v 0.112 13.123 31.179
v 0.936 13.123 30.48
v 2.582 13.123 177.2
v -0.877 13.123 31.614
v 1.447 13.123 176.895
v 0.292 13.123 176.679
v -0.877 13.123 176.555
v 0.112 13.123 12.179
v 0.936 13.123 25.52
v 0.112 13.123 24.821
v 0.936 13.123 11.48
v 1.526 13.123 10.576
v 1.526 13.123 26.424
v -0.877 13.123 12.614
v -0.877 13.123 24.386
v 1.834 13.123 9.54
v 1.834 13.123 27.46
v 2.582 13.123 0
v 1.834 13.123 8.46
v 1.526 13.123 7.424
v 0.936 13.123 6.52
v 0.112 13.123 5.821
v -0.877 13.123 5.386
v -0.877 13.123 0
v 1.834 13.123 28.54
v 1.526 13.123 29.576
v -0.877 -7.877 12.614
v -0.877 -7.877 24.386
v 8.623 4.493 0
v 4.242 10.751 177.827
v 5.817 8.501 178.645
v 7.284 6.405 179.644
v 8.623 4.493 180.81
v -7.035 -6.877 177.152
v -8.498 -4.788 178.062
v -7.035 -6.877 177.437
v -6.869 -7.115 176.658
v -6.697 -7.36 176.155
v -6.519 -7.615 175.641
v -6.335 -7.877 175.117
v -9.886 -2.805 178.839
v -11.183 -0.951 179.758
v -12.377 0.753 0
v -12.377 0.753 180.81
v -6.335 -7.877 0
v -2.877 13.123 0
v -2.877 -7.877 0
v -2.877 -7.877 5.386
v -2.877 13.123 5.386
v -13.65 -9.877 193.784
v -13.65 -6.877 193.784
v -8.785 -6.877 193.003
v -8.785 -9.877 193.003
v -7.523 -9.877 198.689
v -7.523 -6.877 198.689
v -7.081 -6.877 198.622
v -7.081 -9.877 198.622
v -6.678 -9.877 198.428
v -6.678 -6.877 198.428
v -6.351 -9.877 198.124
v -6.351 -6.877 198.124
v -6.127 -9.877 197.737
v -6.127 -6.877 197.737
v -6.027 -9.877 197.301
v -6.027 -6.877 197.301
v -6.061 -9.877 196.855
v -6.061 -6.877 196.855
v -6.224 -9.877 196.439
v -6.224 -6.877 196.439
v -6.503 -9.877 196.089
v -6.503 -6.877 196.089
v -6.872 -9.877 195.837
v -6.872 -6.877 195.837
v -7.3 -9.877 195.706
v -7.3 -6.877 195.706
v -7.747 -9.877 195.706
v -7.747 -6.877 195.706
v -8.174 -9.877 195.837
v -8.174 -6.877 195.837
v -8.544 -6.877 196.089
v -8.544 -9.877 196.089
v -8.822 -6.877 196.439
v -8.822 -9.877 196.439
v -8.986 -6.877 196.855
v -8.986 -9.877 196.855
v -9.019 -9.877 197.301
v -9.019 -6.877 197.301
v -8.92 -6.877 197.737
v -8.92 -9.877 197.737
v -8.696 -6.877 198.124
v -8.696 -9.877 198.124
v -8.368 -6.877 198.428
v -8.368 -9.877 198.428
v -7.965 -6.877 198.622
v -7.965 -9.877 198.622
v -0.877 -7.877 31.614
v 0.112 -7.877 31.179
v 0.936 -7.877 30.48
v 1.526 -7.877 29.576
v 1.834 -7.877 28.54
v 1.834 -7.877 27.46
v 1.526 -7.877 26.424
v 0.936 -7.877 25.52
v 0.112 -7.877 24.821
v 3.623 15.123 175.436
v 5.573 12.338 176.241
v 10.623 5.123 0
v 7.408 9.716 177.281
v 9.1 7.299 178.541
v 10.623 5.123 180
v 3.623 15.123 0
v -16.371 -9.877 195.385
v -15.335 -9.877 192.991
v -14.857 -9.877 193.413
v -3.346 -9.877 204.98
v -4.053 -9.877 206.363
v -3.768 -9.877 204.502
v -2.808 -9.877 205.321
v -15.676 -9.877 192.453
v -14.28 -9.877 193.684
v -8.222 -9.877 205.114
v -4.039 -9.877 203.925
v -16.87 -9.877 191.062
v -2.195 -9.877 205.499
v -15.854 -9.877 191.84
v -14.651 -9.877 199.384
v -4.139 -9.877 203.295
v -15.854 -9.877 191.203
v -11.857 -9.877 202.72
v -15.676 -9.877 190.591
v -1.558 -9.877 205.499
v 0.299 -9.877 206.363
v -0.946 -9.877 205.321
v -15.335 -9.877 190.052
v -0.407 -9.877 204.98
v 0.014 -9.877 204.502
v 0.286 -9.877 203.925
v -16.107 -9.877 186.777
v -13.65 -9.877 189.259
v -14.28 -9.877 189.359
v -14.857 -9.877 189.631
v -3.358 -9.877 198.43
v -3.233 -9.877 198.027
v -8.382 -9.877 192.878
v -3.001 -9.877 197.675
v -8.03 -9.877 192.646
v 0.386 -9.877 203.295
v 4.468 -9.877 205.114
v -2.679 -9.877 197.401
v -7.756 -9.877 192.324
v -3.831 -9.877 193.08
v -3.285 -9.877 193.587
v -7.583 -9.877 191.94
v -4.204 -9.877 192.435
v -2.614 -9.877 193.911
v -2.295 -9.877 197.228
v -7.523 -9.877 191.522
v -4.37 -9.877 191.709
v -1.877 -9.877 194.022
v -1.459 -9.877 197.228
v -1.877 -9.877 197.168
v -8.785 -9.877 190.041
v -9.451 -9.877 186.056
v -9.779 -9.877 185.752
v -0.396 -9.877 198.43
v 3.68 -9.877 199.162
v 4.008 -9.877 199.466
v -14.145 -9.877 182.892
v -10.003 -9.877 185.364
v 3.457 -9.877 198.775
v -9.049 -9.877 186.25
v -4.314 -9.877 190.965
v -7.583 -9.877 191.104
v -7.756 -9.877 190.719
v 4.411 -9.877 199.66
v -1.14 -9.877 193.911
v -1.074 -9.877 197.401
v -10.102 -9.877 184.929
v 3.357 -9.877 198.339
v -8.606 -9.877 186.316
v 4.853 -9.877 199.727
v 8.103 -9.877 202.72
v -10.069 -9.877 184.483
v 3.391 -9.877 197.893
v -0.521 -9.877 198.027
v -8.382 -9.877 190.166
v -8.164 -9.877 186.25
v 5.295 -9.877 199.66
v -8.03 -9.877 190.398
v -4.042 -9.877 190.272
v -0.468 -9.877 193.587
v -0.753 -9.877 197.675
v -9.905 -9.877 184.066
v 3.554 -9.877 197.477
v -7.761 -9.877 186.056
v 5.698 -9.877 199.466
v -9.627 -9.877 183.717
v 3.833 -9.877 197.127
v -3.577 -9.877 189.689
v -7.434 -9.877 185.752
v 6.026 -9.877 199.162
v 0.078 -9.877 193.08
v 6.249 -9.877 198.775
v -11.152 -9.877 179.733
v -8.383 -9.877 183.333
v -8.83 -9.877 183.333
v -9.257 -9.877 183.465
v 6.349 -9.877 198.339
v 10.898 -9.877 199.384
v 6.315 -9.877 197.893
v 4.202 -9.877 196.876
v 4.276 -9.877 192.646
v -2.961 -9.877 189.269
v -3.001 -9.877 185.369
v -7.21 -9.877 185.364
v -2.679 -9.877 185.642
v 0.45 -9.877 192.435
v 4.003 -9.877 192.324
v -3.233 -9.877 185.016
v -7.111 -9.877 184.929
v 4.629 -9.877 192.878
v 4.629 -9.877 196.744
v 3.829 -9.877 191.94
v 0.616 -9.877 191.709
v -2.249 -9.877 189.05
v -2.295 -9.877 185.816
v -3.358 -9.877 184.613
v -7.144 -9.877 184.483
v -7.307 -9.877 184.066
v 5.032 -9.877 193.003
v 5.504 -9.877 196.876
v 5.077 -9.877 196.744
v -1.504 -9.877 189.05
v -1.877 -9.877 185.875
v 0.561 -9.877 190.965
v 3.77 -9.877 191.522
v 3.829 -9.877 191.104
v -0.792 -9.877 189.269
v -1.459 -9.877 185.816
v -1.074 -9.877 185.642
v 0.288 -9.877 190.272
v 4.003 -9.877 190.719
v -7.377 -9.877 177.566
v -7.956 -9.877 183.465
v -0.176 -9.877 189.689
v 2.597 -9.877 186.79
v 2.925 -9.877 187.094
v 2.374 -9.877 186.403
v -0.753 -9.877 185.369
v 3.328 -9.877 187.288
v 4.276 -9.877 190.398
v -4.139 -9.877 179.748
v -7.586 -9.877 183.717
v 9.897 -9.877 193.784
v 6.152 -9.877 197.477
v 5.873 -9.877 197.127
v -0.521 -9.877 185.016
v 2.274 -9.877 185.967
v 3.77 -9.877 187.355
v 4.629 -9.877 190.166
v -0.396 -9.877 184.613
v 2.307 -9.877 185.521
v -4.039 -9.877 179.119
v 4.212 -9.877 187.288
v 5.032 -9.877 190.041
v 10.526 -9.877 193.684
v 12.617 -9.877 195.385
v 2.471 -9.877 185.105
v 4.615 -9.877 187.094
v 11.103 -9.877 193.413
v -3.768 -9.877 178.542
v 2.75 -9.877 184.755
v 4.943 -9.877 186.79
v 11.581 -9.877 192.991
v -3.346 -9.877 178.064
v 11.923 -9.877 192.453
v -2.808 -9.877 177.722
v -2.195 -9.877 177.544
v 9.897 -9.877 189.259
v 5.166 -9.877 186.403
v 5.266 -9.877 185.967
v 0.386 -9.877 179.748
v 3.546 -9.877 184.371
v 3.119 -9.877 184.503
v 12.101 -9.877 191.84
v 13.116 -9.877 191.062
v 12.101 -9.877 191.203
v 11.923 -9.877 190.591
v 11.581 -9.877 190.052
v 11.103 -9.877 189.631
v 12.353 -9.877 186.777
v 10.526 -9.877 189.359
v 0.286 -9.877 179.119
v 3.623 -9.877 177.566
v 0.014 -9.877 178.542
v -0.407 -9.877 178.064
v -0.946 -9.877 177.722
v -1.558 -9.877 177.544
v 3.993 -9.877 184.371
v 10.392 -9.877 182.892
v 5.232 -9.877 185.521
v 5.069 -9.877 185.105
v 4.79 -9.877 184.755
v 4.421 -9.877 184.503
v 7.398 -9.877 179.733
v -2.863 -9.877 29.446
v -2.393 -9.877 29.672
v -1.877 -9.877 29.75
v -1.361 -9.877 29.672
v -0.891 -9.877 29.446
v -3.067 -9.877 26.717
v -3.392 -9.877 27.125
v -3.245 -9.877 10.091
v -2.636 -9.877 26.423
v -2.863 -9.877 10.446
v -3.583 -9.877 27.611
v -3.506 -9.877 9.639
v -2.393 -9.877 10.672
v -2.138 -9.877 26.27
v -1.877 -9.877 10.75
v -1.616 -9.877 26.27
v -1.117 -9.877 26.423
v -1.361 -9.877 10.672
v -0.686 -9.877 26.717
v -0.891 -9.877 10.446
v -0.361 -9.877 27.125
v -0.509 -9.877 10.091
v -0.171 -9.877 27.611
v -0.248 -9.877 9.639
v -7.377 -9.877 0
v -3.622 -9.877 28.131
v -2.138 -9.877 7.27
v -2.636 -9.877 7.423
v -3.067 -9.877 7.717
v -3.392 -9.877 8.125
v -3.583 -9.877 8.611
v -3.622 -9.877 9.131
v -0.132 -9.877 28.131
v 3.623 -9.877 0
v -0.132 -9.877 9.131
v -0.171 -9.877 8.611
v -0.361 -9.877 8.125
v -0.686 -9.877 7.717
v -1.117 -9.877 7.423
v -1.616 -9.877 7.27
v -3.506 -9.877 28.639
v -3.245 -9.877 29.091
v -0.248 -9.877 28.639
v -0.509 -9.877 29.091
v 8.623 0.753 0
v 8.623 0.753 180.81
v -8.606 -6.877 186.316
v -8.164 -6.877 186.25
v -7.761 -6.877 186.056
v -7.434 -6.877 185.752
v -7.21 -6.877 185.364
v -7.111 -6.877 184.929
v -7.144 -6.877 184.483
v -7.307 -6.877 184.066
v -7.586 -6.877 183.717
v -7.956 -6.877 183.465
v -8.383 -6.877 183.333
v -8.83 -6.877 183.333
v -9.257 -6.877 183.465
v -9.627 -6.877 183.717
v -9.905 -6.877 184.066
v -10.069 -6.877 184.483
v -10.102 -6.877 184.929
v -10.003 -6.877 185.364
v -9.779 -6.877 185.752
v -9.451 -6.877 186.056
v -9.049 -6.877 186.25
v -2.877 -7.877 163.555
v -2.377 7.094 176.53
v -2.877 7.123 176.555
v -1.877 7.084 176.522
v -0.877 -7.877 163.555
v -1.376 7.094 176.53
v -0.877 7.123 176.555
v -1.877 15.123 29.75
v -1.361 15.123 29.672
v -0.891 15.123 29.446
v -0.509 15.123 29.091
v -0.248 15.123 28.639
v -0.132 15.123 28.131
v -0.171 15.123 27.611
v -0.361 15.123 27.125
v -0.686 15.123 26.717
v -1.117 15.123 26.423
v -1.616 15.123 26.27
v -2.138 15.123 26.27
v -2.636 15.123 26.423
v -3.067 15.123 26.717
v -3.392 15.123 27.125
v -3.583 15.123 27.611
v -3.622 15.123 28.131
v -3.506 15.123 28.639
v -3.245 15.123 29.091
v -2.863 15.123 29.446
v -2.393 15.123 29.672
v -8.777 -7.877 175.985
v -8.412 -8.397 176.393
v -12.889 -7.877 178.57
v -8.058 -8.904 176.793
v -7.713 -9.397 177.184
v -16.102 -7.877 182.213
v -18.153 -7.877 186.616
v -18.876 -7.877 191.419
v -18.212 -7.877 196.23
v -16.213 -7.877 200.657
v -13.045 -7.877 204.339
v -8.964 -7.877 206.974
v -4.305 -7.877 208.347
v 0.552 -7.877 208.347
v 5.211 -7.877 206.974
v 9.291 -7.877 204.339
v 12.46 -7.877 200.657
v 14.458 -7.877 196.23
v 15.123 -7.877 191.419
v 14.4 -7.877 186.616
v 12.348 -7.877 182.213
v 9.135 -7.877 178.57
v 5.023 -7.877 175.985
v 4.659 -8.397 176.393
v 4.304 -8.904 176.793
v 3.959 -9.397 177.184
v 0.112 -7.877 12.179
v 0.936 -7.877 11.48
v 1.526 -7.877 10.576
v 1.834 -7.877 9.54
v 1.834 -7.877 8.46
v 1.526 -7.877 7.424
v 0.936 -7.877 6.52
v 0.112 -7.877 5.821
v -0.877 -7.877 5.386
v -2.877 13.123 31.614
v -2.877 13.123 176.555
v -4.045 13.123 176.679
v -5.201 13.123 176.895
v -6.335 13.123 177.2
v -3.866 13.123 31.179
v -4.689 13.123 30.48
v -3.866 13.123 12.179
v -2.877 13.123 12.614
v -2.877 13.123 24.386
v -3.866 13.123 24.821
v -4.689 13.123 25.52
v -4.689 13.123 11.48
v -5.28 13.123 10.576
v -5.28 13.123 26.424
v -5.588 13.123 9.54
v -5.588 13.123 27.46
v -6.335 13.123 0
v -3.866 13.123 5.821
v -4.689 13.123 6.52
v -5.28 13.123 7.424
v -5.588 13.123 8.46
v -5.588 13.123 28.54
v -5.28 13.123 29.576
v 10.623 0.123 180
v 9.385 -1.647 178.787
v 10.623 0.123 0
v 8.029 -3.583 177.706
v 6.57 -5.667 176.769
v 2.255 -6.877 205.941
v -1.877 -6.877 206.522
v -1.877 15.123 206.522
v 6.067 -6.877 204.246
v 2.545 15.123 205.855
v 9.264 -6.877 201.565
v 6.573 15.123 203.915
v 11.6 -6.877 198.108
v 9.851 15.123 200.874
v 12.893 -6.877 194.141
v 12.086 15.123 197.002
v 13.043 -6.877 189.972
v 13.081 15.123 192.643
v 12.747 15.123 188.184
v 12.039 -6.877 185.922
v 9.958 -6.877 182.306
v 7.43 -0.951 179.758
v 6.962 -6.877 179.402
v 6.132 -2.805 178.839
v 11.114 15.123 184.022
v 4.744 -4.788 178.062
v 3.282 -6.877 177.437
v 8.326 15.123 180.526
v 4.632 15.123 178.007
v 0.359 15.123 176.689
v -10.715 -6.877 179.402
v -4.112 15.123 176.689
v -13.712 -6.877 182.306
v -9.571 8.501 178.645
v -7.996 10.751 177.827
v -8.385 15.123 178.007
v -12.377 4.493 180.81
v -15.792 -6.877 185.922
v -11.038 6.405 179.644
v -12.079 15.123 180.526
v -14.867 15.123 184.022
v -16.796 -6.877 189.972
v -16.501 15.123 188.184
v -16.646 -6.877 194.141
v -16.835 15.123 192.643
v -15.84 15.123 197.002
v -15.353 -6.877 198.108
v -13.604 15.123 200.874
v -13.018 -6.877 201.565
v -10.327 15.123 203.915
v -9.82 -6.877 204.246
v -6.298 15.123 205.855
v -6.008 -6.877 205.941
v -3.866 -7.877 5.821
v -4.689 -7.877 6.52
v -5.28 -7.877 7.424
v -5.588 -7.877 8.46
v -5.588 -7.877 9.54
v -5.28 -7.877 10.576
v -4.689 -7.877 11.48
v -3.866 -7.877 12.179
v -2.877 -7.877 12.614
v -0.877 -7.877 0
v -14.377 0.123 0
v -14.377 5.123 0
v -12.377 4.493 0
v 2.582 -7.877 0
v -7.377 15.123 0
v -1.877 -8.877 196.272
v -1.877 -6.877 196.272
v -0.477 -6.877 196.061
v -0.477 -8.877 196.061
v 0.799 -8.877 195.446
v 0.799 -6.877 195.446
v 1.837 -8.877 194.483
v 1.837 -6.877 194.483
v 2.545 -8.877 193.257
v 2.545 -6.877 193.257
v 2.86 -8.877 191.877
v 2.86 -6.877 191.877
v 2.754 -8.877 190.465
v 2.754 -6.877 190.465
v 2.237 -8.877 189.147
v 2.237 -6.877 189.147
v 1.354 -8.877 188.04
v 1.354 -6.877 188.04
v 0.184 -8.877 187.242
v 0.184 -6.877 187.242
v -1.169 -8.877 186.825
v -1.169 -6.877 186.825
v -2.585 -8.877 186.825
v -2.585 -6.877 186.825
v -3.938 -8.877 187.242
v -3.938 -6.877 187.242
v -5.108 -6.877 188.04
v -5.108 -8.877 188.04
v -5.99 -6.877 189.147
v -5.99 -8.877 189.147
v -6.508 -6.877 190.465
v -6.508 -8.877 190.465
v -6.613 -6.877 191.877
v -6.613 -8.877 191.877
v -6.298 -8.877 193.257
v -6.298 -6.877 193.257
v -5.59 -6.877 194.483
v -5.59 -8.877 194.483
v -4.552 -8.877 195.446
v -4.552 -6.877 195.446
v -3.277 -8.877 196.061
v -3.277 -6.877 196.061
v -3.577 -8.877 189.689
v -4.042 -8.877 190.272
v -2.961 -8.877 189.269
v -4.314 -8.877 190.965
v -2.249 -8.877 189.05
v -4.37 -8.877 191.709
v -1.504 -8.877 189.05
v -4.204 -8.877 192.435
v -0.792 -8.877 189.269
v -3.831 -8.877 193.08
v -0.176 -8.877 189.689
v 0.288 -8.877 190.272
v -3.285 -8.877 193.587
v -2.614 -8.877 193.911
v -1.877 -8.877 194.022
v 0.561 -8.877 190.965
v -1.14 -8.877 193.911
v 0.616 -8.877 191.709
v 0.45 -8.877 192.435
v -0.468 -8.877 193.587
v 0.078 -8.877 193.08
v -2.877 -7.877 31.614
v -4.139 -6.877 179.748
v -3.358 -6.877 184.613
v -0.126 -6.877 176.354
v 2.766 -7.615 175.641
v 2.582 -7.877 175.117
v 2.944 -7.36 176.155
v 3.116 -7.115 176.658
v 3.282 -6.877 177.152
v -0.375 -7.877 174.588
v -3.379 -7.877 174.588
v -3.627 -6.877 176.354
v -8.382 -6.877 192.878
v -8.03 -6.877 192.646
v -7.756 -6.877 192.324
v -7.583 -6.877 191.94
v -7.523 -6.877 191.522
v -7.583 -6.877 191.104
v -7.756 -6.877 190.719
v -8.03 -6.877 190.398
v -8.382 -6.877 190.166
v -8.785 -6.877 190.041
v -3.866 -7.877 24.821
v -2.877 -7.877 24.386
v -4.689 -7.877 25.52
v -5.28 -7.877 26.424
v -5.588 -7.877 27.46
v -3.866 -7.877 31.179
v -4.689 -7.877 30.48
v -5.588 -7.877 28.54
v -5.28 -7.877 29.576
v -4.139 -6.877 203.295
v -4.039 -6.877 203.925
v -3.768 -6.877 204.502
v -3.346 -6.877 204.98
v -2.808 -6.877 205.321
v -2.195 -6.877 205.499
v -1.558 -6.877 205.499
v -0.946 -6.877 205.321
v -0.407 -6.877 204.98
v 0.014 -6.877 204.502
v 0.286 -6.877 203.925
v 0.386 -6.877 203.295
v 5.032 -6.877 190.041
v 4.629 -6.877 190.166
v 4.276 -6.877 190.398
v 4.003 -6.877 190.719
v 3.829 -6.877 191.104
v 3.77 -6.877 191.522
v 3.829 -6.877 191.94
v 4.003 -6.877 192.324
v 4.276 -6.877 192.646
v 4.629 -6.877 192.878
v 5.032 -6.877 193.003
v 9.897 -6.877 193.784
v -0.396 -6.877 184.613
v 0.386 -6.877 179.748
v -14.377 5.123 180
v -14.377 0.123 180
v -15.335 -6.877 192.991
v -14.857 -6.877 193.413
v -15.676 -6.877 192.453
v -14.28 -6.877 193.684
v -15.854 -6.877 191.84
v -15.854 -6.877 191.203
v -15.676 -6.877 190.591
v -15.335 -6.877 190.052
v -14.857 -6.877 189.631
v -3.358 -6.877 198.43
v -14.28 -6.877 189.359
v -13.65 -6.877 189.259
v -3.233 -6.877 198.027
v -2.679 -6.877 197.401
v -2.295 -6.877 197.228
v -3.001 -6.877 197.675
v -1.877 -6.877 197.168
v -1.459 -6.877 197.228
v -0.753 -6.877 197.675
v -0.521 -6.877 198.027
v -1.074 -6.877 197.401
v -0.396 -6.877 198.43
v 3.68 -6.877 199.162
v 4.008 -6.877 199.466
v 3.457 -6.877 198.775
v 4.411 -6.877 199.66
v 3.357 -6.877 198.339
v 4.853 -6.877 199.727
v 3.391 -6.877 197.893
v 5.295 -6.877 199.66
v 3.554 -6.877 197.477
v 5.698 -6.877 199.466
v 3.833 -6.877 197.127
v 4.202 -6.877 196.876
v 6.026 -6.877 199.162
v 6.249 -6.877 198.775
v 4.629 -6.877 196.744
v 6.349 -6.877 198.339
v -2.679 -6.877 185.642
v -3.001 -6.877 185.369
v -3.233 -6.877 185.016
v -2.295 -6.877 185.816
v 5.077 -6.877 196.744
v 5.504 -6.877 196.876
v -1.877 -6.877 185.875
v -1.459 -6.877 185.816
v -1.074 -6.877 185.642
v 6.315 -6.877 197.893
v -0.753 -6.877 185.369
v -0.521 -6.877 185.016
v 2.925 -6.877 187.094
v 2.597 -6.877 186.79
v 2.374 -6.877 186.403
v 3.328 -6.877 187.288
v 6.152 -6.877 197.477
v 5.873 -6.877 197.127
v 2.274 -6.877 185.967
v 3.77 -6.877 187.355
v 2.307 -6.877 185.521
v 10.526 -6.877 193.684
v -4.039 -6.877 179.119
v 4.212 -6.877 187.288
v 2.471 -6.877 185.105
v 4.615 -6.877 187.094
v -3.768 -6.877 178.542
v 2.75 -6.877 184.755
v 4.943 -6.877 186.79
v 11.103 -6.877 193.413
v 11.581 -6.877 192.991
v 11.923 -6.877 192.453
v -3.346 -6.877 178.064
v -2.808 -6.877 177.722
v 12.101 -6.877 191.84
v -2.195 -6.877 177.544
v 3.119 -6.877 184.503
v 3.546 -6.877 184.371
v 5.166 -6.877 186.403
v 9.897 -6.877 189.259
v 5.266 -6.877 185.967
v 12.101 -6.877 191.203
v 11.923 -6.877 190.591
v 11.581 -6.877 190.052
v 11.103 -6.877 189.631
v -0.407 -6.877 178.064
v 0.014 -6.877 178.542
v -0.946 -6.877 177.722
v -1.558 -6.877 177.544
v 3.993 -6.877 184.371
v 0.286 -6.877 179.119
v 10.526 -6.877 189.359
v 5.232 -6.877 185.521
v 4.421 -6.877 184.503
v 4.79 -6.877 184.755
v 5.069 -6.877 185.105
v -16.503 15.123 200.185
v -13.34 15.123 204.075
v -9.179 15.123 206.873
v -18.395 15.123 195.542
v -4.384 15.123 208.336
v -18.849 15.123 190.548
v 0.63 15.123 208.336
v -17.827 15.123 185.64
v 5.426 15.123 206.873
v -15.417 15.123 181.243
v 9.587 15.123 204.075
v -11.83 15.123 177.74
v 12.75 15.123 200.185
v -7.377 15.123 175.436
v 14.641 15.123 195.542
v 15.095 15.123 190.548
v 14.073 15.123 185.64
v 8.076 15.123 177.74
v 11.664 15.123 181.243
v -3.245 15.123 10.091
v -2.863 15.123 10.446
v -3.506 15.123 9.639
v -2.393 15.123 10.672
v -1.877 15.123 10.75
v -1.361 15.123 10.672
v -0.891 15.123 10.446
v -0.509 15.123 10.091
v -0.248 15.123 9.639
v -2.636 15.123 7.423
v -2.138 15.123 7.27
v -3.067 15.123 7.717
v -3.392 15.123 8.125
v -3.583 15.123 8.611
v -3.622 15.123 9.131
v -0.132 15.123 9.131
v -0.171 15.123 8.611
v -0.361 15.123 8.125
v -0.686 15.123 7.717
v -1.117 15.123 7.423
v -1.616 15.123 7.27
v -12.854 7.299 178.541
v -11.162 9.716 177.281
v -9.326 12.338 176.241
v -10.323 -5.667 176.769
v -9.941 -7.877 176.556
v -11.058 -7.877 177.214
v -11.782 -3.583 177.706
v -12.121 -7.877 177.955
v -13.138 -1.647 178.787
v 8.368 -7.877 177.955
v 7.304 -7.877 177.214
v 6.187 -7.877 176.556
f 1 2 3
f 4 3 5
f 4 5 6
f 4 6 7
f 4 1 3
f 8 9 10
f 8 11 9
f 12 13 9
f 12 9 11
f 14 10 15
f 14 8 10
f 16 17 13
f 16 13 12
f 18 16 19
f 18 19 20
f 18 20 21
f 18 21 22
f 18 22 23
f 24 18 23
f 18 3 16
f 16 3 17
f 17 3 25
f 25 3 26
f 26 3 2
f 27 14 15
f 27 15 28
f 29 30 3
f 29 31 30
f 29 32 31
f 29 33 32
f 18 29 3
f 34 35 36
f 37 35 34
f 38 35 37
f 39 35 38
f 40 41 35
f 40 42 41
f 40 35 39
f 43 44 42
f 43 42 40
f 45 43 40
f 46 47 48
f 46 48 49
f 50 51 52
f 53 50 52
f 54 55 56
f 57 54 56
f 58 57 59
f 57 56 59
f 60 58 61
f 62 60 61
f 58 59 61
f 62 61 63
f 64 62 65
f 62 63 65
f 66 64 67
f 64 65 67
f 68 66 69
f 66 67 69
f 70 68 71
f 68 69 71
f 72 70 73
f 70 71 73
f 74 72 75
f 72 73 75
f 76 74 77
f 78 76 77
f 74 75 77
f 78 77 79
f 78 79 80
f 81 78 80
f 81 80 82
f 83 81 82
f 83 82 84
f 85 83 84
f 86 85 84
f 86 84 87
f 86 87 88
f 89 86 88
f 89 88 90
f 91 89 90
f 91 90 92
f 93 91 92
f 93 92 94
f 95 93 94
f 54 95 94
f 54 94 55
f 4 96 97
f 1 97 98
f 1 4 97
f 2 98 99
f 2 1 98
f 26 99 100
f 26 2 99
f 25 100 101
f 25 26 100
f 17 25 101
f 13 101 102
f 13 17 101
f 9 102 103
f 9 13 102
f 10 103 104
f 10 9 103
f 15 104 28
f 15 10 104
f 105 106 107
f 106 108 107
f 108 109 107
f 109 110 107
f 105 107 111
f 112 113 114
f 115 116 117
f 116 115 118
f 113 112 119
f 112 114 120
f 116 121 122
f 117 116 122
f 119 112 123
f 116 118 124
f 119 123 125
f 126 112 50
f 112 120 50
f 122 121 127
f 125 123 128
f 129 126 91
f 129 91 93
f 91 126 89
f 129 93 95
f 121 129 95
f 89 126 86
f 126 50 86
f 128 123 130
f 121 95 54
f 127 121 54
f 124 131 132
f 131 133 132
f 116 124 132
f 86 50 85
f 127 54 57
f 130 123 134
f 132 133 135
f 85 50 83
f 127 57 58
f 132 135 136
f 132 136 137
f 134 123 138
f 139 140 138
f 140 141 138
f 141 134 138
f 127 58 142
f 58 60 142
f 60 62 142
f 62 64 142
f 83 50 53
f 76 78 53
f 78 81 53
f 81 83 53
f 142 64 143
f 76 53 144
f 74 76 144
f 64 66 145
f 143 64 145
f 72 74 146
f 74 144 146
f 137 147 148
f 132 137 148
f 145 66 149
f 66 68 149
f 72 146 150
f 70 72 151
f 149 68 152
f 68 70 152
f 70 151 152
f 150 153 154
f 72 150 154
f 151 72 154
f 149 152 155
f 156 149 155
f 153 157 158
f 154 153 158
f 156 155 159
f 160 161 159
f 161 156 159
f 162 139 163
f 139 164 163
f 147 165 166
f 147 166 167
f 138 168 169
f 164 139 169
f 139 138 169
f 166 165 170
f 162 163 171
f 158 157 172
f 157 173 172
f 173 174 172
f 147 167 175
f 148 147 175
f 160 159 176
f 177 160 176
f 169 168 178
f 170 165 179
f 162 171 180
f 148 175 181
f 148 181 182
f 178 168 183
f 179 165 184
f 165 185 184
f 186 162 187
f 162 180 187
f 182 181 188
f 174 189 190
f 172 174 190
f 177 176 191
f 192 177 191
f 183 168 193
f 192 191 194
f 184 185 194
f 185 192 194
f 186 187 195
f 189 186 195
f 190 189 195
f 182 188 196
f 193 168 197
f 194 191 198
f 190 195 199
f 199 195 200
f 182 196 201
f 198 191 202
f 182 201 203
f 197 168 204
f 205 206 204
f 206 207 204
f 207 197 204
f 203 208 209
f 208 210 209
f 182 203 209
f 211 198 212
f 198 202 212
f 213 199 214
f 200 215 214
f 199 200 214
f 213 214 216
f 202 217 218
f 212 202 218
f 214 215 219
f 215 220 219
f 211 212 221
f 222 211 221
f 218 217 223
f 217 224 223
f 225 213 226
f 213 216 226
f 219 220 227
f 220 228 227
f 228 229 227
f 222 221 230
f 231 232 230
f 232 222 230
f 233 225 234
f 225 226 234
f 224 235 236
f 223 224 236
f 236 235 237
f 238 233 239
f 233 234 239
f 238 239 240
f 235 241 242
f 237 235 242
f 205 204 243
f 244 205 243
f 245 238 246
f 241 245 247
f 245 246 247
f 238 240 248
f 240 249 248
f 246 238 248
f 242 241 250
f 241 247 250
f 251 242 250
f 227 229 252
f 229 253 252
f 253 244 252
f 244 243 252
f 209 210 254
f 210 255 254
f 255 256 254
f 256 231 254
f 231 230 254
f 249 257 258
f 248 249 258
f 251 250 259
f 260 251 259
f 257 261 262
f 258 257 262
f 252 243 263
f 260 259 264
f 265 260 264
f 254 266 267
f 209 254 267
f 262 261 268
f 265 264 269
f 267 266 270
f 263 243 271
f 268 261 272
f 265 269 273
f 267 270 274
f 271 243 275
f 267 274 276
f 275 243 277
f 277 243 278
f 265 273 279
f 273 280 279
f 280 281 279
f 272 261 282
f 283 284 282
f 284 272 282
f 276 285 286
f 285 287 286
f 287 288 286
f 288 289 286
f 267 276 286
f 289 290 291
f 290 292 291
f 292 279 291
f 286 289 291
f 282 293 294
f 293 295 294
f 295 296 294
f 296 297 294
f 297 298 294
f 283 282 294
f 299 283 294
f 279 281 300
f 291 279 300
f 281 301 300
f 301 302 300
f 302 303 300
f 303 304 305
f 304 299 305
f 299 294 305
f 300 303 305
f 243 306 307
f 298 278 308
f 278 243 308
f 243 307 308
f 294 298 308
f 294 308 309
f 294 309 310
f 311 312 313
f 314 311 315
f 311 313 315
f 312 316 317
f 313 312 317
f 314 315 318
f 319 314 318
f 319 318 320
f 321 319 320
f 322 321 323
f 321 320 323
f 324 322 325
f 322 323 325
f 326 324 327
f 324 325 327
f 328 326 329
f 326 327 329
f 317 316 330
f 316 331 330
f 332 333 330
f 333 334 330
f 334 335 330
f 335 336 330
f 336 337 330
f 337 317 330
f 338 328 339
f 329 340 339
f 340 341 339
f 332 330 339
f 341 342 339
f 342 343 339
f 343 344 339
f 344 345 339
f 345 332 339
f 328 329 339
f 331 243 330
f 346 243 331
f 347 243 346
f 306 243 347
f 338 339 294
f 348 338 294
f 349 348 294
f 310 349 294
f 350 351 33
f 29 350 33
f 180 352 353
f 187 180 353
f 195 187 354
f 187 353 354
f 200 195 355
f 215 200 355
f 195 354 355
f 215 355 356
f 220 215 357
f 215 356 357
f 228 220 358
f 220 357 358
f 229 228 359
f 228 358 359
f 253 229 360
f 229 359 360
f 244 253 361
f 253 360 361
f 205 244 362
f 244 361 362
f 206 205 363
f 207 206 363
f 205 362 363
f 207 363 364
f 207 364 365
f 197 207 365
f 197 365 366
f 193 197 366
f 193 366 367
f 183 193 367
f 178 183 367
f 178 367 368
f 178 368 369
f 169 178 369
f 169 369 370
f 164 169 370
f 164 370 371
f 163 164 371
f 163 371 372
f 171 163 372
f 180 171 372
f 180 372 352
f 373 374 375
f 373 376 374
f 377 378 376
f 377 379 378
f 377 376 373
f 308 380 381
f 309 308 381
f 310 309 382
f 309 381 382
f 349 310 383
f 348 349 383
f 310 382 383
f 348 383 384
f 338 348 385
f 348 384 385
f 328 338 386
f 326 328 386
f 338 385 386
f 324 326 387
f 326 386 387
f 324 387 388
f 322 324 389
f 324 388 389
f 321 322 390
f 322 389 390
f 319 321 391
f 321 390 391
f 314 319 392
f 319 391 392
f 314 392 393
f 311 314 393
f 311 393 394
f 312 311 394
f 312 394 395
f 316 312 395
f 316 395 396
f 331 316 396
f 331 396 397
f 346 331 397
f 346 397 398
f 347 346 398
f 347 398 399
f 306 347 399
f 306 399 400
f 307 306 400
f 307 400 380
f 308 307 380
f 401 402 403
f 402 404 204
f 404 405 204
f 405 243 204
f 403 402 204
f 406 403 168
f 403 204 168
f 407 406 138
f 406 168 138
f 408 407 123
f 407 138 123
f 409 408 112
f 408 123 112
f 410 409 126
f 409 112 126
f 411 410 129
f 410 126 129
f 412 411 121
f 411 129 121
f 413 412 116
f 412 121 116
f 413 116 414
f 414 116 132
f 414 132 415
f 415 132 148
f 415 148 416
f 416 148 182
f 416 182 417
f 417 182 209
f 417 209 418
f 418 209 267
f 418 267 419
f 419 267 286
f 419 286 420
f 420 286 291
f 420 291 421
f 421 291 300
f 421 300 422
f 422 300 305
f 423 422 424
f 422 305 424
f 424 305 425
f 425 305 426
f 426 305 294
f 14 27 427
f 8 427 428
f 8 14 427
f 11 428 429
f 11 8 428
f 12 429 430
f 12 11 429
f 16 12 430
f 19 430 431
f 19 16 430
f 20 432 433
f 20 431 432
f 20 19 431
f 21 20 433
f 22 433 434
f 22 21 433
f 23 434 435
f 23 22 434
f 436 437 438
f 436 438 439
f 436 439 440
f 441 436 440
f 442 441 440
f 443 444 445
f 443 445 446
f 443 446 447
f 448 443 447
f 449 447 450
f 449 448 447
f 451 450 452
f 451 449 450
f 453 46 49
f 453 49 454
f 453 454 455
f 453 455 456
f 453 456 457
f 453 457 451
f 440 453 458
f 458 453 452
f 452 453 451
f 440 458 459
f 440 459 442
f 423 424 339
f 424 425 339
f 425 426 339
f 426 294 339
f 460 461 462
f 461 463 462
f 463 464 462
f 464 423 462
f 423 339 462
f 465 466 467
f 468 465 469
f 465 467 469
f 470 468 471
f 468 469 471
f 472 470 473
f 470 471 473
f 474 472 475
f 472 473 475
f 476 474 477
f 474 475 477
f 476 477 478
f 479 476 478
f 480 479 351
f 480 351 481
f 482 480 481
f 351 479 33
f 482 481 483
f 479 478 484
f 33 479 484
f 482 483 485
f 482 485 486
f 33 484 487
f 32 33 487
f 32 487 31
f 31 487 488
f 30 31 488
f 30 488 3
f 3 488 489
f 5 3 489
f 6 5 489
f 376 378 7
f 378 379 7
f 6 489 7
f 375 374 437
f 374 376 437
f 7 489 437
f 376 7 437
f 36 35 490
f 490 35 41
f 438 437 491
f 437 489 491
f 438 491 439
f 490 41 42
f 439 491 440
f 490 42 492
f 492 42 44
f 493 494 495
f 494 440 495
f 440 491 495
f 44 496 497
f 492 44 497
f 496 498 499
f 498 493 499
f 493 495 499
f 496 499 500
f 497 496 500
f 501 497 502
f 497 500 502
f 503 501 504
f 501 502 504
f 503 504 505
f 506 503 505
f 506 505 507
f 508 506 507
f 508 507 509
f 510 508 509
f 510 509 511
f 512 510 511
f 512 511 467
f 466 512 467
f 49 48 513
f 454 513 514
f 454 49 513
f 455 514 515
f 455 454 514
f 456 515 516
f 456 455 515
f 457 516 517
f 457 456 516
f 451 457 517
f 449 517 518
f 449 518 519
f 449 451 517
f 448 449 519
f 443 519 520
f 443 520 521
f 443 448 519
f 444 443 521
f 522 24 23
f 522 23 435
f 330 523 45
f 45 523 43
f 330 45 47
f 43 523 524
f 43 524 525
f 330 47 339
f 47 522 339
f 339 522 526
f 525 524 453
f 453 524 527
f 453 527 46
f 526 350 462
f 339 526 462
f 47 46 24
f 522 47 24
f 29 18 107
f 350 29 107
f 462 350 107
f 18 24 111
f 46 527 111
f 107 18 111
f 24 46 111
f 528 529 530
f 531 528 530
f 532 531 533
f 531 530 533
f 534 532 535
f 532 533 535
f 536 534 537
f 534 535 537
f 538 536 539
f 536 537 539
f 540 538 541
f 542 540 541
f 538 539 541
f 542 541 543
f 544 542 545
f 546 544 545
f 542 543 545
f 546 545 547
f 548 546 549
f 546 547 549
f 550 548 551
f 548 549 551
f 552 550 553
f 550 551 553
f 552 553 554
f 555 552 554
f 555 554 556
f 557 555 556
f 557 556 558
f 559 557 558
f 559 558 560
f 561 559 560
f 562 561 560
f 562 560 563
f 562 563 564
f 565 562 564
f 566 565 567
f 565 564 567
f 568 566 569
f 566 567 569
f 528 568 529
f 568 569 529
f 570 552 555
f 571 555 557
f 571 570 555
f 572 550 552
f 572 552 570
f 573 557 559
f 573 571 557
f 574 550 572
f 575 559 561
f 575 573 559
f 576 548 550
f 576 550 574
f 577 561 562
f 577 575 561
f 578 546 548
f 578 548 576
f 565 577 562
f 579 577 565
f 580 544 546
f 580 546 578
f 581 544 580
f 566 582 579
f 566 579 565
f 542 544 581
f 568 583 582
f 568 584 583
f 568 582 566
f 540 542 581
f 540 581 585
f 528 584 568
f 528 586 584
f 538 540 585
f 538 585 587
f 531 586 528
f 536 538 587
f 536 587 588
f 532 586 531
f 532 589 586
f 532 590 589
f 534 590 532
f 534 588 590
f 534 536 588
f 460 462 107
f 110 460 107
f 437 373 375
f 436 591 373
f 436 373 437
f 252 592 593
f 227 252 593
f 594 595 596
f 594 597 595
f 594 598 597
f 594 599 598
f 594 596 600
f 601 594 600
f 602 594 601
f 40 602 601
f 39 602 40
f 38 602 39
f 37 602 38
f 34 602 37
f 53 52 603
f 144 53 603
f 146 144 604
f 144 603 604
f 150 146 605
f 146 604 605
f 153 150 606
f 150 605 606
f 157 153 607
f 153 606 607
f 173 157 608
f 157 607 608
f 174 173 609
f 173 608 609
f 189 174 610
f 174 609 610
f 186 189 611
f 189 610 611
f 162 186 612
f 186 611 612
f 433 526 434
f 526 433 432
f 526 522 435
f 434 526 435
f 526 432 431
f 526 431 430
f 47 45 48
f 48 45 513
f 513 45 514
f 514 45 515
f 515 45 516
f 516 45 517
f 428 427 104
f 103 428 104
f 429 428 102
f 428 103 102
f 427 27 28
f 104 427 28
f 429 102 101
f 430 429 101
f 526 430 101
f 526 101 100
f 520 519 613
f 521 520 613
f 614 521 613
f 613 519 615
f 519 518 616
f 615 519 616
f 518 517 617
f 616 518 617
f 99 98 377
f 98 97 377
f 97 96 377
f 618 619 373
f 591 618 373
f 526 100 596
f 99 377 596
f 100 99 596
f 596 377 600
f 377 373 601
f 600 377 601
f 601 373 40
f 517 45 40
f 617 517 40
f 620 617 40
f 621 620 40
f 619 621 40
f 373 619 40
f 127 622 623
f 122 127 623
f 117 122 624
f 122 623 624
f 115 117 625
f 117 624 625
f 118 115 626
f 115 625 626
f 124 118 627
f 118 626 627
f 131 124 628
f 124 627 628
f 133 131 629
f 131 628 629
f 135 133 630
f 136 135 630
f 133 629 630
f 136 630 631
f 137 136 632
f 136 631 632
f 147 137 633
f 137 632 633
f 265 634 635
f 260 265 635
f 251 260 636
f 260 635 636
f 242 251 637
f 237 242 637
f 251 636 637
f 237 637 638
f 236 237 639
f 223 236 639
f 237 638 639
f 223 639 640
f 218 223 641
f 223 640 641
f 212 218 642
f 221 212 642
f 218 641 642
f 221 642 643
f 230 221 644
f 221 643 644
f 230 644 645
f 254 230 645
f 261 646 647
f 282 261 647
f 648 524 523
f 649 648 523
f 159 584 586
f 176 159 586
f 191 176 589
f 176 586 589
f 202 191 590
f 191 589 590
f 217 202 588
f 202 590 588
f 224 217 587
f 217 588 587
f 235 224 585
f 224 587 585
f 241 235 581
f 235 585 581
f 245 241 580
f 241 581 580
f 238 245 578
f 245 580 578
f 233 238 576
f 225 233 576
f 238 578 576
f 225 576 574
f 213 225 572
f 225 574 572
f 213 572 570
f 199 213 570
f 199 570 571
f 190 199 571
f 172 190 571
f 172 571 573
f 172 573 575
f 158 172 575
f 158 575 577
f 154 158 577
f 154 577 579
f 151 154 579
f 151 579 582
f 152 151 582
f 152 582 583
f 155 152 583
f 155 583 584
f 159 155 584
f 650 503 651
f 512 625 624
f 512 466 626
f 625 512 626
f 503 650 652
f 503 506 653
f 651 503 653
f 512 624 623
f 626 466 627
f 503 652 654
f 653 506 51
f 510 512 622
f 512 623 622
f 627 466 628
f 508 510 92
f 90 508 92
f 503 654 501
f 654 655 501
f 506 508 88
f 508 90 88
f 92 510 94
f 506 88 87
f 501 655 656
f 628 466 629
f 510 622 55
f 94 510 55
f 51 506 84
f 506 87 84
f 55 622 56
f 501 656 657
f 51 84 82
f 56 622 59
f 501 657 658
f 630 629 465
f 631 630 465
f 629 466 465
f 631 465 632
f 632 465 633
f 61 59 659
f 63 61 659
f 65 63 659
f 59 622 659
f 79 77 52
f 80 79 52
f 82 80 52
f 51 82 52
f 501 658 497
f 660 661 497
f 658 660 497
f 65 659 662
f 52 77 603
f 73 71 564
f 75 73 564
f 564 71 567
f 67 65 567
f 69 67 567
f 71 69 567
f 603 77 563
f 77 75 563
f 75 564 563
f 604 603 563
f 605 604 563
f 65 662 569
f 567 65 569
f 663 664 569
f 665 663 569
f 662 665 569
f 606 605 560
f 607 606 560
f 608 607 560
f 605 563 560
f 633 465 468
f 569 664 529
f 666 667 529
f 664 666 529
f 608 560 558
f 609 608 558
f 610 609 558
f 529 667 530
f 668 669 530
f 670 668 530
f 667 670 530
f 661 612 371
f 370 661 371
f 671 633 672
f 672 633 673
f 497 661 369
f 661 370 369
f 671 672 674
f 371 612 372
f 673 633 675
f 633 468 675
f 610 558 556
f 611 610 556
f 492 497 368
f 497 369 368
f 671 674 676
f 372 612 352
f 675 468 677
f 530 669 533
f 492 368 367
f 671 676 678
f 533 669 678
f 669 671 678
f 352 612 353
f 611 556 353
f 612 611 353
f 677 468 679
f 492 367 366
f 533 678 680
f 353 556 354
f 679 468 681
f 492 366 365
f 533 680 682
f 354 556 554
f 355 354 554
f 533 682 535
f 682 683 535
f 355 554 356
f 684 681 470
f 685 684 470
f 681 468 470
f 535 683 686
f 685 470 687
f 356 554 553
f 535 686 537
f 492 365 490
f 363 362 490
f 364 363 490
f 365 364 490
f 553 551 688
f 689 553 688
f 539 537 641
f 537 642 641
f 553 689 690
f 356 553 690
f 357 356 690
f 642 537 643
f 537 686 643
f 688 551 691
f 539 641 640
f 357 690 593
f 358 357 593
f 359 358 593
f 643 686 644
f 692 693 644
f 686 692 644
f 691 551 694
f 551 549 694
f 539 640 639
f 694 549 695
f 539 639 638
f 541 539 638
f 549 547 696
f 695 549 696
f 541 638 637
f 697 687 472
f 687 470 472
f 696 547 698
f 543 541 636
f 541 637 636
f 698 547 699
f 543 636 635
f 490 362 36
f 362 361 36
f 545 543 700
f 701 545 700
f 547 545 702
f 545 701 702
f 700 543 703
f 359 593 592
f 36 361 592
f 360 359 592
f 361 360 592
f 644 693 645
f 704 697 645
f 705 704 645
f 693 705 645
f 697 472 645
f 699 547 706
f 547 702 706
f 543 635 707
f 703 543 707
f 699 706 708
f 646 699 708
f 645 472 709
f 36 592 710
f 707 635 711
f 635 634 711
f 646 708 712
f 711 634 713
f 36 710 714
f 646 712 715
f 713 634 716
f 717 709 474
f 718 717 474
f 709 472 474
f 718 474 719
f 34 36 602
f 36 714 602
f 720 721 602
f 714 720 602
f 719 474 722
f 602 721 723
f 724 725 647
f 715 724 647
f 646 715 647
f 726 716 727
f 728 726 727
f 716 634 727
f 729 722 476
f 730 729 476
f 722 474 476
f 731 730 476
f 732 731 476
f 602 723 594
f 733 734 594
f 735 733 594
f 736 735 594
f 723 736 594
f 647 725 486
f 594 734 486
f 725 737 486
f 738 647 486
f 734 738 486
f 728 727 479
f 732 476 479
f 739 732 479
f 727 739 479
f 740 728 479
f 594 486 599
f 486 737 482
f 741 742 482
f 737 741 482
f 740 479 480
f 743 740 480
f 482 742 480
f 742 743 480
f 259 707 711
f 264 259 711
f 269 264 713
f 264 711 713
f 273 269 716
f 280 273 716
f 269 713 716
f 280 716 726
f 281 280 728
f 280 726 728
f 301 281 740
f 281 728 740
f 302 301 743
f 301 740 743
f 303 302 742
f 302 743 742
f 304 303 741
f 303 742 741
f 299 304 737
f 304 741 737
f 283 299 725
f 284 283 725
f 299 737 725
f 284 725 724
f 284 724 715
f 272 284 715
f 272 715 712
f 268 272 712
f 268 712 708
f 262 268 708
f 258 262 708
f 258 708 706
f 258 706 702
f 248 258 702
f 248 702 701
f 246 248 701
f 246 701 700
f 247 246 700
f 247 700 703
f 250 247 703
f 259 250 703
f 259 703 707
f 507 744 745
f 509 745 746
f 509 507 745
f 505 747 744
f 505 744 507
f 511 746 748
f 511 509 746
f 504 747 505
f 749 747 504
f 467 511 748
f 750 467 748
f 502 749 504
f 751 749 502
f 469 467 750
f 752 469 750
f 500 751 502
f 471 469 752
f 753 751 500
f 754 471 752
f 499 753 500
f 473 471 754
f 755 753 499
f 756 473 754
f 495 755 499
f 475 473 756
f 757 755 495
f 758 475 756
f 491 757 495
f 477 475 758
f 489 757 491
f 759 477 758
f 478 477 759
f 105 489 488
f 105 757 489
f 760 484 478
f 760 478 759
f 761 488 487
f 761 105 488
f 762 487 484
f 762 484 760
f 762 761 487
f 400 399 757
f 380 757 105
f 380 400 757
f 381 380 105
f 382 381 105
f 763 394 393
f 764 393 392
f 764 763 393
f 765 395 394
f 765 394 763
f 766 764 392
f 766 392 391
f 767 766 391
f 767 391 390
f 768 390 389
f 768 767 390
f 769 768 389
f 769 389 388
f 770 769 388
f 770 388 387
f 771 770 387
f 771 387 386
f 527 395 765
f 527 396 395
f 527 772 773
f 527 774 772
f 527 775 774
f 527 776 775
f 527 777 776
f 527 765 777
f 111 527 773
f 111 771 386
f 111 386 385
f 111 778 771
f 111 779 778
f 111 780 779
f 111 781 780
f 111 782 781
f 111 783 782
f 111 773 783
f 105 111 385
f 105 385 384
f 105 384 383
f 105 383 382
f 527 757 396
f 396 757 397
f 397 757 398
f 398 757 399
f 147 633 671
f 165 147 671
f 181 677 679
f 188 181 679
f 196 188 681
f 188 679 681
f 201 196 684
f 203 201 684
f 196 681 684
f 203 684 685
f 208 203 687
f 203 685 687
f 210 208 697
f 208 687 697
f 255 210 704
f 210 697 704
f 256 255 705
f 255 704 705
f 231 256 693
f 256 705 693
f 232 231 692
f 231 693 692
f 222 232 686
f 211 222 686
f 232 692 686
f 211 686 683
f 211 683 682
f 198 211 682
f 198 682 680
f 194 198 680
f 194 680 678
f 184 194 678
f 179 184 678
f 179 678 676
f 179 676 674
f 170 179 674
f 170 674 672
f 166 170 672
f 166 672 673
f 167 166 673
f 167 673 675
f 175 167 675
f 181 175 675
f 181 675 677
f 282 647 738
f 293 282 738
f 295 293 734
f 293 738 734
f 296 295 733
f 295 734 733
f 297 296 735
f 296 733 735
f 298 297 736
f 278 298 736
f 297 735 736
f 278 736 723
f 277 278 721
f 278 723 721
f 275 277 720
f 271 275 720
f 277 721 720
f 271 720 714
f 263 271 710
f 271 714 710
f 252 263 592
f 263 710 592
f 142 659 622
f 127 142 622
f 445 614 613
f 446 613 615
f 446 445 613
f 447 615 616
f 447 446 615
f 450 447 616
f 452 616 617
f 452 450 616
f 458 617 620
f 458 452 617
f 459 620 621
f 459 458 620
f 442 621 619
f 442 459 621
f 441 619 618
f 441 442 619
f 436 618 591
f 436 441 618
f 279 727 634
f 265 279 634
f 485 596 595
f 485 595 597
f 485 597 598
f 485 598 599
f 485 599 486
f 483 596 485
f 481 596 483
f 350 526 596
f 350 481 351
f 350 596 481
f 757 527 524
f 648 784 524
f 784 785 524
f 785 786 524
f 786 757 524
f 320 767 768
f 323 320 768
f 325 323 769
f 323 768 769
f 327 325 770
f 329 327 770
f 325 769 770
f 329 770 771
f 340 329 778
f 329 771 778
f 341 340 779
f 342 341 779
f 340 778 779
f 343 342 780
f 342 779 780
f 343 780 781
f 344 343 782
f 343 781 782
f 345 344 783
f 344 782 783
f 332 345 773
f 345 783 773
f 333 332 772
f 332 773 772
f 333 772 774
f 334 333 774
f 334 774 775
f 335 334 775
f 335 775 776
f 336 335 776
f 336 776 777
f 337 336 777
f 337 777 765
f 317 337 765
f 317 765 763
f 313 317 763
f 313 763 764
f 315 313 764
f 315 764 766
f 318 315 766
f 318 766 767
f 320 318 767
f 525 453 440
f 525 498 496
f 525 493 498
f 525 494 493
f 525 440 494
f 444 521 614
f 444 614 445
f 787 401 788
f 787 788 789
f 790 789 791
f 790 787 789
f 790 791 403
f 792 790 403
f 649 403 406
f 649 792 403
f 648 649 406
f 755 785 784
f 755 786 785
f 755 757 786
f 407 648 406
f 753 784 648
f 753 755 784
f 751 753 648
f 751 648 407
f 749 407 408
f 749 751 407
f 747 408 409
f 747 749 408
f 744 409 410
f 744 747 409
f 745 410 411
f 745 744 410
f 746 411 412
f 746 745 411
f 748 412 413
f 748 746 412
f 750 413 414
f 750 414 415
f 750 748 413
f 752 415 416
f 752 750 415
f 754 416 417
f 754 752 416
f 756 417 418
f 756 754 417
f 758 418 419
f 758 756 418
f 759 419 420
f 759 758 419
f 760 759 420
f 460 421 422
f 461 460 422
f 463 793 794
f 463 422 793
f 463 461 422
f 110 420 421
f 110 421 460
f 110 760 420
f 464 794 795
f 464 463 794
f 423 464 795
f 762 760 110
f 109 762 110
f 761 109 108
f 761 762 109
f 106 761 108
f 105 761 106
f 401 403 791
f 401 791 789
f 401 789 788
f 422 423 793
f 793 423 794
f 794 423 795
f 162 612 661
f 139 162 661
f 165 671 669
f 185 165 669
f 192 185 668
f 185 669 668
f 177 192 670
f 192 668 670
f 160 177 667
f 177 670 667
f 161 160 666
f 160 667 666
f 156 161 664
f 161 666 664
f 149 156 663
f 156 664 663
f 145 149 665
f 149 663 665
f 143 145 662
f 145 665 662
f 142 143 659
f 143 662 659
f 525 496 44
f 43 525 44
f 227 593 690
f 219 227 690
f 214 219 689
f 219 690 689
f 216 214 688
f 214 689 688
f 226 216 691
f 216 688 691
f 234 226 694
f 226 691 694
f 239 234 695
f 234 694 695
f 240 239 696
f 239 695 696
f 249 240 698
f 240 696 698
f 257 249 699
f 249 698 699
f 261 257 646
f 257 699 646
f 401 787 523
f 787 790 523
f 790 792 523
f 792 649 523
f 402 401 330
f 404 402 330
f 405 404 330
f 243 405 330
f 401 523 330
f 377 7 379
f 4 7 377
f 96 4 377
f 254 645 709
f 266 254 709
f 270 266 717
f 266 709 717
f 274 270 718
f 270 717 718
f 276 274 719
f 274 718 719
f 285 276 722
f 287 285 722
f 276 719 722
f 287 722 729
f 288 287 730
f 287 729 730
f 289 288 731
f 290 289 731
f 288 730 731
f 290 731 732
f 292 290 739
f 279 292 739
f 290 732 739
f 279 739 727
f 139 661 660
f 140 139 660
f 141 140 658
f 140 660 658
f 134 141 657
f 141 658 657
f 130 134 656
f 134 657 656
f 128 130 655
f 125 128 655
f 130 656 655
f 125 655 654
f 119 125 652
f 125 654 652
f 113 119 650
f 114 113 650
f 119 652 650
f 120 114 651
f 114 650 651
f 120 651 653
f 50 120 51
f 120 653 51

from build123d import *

# Parameters (mm, degrees)
ESTRUSIONE_ESTRUSIONE1_DEPTH = 180
SCHIZZO3_R                   = 17
TAGLIO_ESTRUSIONE2_DEPTH     = 183.295611683
SCHIZZO4_R                   = 15
ESTRUSIONE_ESTRUSIONE2_DEPTH = 25
ESTRUSIONE_ESTRUSIONE3_START = -2
SCHIZZO6_R                   = 15
ESTRUSIONE_ESTRUSIONE3_DEPTH = 2
TAGLIO_ESTRUSIONE4_REACH     = 211.92
TAGLIO_ESTRUSIONE5_REACH     = 211.843
ESTRUSIONE_ESTRUSIONE4_START = 1
SCHIZZO11_R                  = 15
ESTRUSIONE_ESTRUSIONE4_DEPTH = 1
SMUSSO1_SIZE                 = 2
SMUSSO1_SIZE_2               = 1.154700538
SMUSSO2_SIZE                 = 2
SCHIZZO12_R                  = 2.5
TAGLIO_ESTRUSIONE6_DEPTH     = 211.527047297
SCHIZZO13_R                  = 4.75
TAGLIO_ESTRUSIONE7_DEPTH     = 2
SCHIZZO14_R                  = 1.5
TAGLIO_ESTRUSIONE9_DEPTH     = 211.527047297
SCHIZZO15_R                  = 3.75
ESTRUSIONE_ESTRUSIONE5_DEPTH = 25
SCHIZZO16_R                  = 1.75
TAGLIO_ESTRUSIONE10_DEPTH    = 211.861655223
TAGLIO_ESTRUSIONE11_DEPTH    = 211.527047297


# Some blends are built 0.0001 mm under size
with BuildPart() as part:
    # Schizzo1 → Estrusione-Estrusione1 (new body)
    with BuildSketch(Plane.XY):
        Polygon((10.623281363, 5.122982669), (3.623281363, 15.122982669), (-7.376718637, 15.122982669), (-14.376718637, 5.122982669), (-14.376718637, 0.122982669), (-7.376718637, -9.877017331), (3.623281363, -9.877017331), (10.623281363, 0.122982669), align=None)
        Polygon((-12.376718637, 4.492538208), (-6.335407514, 13.122982669), (-2.876718637, 13.122982669), (-2.876718637, -7.877017331), (-6.335407514, -7.877017331), (-12.376718637, 0.753427131), align=None, mode=Mode.SUBTRACT)
        Polygon((2.58197024, -7.877017331), (-0.876718637, -7.877017331), (-0.876718637, 13.122982669), (2.58197024, 13.122982669), (8.623281363, 4.492538208), (8.623281363, 0.753427131), align=None, mode=Mode.SUBTRACT)
    extrude(amount=ESTRUSIONE_ESTRUSIONE1_DEPTH)

    # Schizzo3 → Taglio-Estrusione2 (cut, through all)
    with BuildSketch(Plane(origin=(0, 15.122982669, 0), x_dir=(1, 0, 0), z_dir=(0, 1, 0))):
        with Locations((-1.876718637, -191.521718622)):
            Circle(SCHIZZO3_R)
    extrude(amount=-TAGLIO_ESTRUSIONE2_DEPTH, mode=Mode.SUBTRACT)

    # Schizzo4 → Estrusione-Estrusione2 (add, through all)
    with BuildSketch(Plane(origin=(0, 15.122982669, 0), x_dir=(1, 0, 0), z_dir=(0, 1, 0))):
        with BuildLine():
            ThreePointArc((-7.376718637, -175.43601068), (-1.876718637, -208.521718622), (3.623281363, -175.43601068))
            ThreePointArc((3.623281363, -175.43601068), (-1.876718637, -174.521718622), (-7.376718637, -175.43601068))
        make_face()
        with Locations(Location((-1.876718637, -191.521718622, 0), (0, 0, 270))):
            Circle(SCHIZZO4_R, mode=Mode.SUBTRACT)
    extrude(amount=-ESTRUSIONE_ESTRUSIONE2_DEPTH)

    # Schizzo6 → Estrusione-Estrusione3 (add)
    with BuildSketch(Plane.XZ.offset(9.877017331).offset(ESTRUSIONE_ESTRUSIONE3_START)):
        with Locations(Location((-1.876718637, 191.521718622, 0), (0, 0, 90))):
            Circle(SCHIZZO6_R)
    extrude(amount=ESTRUSIONE_ESTRUSIONE3_DEPTH)

    # Schizzo8 → Taglio-Estrusione4 (cut, up to next)
    with BuildSketch(Plane(origin=(0, 0, 0), x_dir=(-1, 0, 0), z_dir=(0, 0, -1)), mode=Mode.PRIVATE) as taglio_estrusione4_sk1:
        Polygon((0.876718637, -7.877017331), (-2.58197024, -7.877017331), (-8.623281363, 0.753427131), (-8.623281363, 4.492538208), (-2.58197024, 13.122982669), (0.876718637, 13.122982669), align=None)
    taglio_estrusione4_tool1 = extrude(taglio_estrusione4_sk1.sketch, amount=-TAGLIO_ESTRUSIONE4_REACH, mode=Mode.PRIVATE) & part.part
    # Schizzo8 → Taglio-Estrusione4 (cut, up to next)
    with BuildSketch(Plane(origin=(0, 0, 0), x_dir=(-1, 0, 0), z_dir=(0, 0, -1)), mode=Mode.PRIVATE) as taglio_estrusione4_sk2:
        Polygon((2.876718637, -7.877017331), (2.876718637, 13.122982669), (6.335407514, 13.122982669), (12.376718637, 4.492538208), (12.376718637, 0.753427131), (6.335407514, -7.877017331), align=None)
    taglio_estrusione4_tool2 = extrude(taglio_estrusione4_sk2.sketch, amount=-TAGLIO_ESTRUSIONE4_REACH, mode=Mode.PRIVATE) & part.part
    add(taglio_estrusione4_tool1.solids().sort_by_distance((2.905149, 2.622983, 0))[0], mode=Mode.SUBTRACT)
    add(taglio_estrusione4_tool2.solids().sort_by_distance((-6.658586, 2.622983, 0))[0], mode=Mode.SUBTRACT)

    # Schizzo10 → Taglio-Estrusione5 (cut, up to next)
    with BuildSketch(Plane(origin=(-0.876718637, 0, 0), x_dir=(0, 0, -1), z_dir=(1, 0, 0)), mode=Mode.PRIVATE) as taglio_estrusione5_sk1:
        Polygon((-176.555089075, -7.877017331), (-176.555089075, 7.122982669), (-163.555089075, -7.877017331), align=None)
    taglio_estrusione5_tool1 = extrude(taglio_estrusione5_sk1.sketch, amount=-TAGLIO_ESTRUSIONE5_REACH, mode=Mode.PRIVATE) & part.part
    add(taglio_estrusione5_tool1.solids().sort_by_distance((-0.876719, -2.877017, 172.221756))[0], mode=Mode.SUBTRACT)

    # Schizzo11 → Estrusione-Estrusione4 (add)
    with BuildSketch(Plane(origin=(0, -7.877017331, 0), x_dir=(1, 0, 0), z_dir=(0, 1, 0)).offset(ESTRUSIONE_ESTRUSIONE4_START)):
        with Locations(Location((-1.876718637, -191.521718622, 0), (0, 0, 270))):
            Circle(SCHIZZO11_R)
    extrude(amount=-ESTRUSIONE_ESTRUSIONE4_DEPTH)

    # Smusso1
    # the kernel refuses this chamfer: 2, 1.154700538 mm, written as the material it adds along each edge
    with BuildSketch(Plane(origin=(-1.876718637, -7.877017331, 191.521718622), x_dir=(0.6026136012063945, 0, -0.7980331118700906), z_dir=(0.7980331118700906, 0, 0.6026136012063945))) as smusso1_piece_1_section:
        Polygon((15 + SMUSSO1_SIZE, 0), (15, SMUSSO1_SIZE_2), (15, 0), align=None)
    smusso1_piece_1 = revolve(axis=Axis((-1.876718637, -7.877017331, 191.521718622), (0, 1, 0)), revolution_arc=74.114626536, mode=Mode.PRIVATE)
    smusso1_piece_1 = split(smusso1_piece_1, bisect_by=Plane(origin=(5.278960516, -6.877017331, 177.600505235), z_dir=(0, -1, 0)), keep=Keep.TOP, mode=Mode.PRIVATE)
    add(smusso1_piece_1)

    # Smusso2
    smusso2_edges = [part.edges().sort_by_distance(p)[0] for p in [
        (-1.876718637, -9.877017331, 208.521718622),
    ]]
    chamfer(smusso2_edges, length=SMUSSO2_SIZE - 0.0001)  # a hair under: the kernel refuses the full size

    # Schizzo12 → Taglio-Estrusione6 (cut, through all)
    with BuildSketch(Plane(origin=(0, -6.877017331, 0), x_dir=(1, 0, 0), z_dir=(0, 1, 0))):
        with Locations(Location((-1.876718637, -191.521718622, 0), (0, 0, 270))):
            Circle(SCHIZZO12_R)
    extrude(amount=-TAGLIO_ESTRUSIONE6_DEPTH, mode=Mode.SUBTRACT)

    # Schizzo13 → Taglio-Estrusione7 (cut)
    with BuildSketch(Plane(origin=(0, -6.877017331, 0), x_dir=(1, 0, 0), z_dir=(0, 1, 0))):
        with Locations(Location((-1.876718637, -191.521718622, 0), (0, 0, 270))):
            Circle(SCHIZZO13_R)
    extrude(amount=-TAGLIO_ESTRUSIONE7_DEPTH, mode=Mode.SUBTRACT)

    # Schizzo14 → Taglio-Estrusione9 (cut, through all)
    with BuildSketch(Plane(origin=(0, -6.877017331, 0), x_dir=(1, 0, 0), z_dir=(0, 1, 0))):
        with Locations(Location((4.852993382, -198.227013257, 0), (0, 0, 270))):
            Circle(SCHIZZO14_R)
        with Locations(Location((-8.606430656, -184.816423987, 0), (0, 0, 270))):
            Circle(SCHIZZO14_R)
        with Locations(Location((-7.52328254, -197.188844533, 0), (0, 0, 270))):
            Circle(SCHIZZO14_R)
        with Locations(Location((3.769845266, -185.854592711, 0), (0, 0, 270))):
            Circle(SCHIZZO14_R)
    extrude(amount=-TAGLIO_ESTRUSIONE9_DEPTH, mode=Mode.SUBTRACT)

    # Schizzo15 → Estrusione-Estrusione5 (add)
    with BuildSketch(Plane(origin=(0, 15.122982669, 0), x_dir=(1, 0, 0), z_dir=(0, 1, 0))):
        with Locations((-1.876718637, -28)):
            Circle(SCHIZZO15_R)
        with Locations((-1.876718637, -9)):
            Circle(SCHIZZO15_R)
    extrude(amount=-ESTRUSIONE_ESTRUSIONE5_DEPTH)

    # Schizzo16 → Taglio-Estrusione10 (cut, through all)
    with BuildSketch(Plane(origin=(0, 15.122982669, 0), x_dir=(1, 0, 0), z_dir=(0, 1, 0))):
        with Locations(Location((-1.876718637, -28, 0), (0, 0, 270))):
            Circle(SCHIZZO16_R)
        with Locations(Location((-1.876718637, -9, 0), (0, 0, 270))):
            Circle(SCHIZZO16_R)
    extrude(amount=-TAGLIO_ESTRUSIONE10_DEPTH, mode=Mode.SUBTRACT)

    # Schizzo17 → Taglio-Estrusione11 (cut, through all)
    with BuildSketch(Plane(origin=(0, -6.877017331, 0), x_dir=(1, 0, 0), z_dir=(0, 1, 0))):
        with BuildLine():
            Line((-8.78535733, -190.040708293), (-13.650216694, -189.259165677))
            ThreePointArc((-13.650216694, -189.259165677), (-15.876718637, -191.521718622), (-13.650216694, -193.784271566))
            Line((-13.650216694, -193.784271566), (-8.78535733, -193.002728951))
            ThreePointArc((-8.78535733, -193.002728951), (-7.52328254, -191.521718622), (-8.78535733, -190.040708293))
        make_face()
        with BuildLine():
            Line((-0.395708308, -184.613079929), (0.385834308, -179.748220565))
            ThreePointArc((0.385834308, -179.748220565), (-1.876718637, -177.521718622), (-4.139271581, -179.748220565))
            Line((-4.139271581, -179.748220565), (-3.357728966, -184.613079929))
            ThreePointArc((-3.357728966, -184.613079929), (-1.876718637, -185.875154719), (-0.395708308, -184.613079929))
        make_face()
        with BuildLine():
            Line((5.031920056, -193.002728951), (9.89677942, -193.784271566))
            ThreePointArc((9.89677942, -193.784271566), (12.123281363, -191.521718622), (9.89677942, -189.259165677))
            Line((9.89677942, -189.259165677), (5.031920056, -190.040708293))
            ThreePointArc((5.031920056, -190.040708293), (3.769845266, -191.521718622), (5.031920056, -193.002728951))
        make_face()
        with BuildLine():
            Line((-3.357728966, -198.430357315), (-4.139271581, -203.295216678))
            ThreePointArc((-4.139271581, -203.295216678), (-1.876718637, -205.521718622), (0.385834308, -203.295216678))
            Line((0.385834308, -203.295216678), (-0.395708308, -198.430357315))
            ThreePointArc((-0.395708308, -198.430357315), (-1.876718637, -197.168282525), (-3.357728966, -198.430357315))
        make_face()
    extrude(amount=-TAGLIO_ESTRUSIONE11_DEPTH, mode=Mode.SUBTRACT)


solid = part.part
